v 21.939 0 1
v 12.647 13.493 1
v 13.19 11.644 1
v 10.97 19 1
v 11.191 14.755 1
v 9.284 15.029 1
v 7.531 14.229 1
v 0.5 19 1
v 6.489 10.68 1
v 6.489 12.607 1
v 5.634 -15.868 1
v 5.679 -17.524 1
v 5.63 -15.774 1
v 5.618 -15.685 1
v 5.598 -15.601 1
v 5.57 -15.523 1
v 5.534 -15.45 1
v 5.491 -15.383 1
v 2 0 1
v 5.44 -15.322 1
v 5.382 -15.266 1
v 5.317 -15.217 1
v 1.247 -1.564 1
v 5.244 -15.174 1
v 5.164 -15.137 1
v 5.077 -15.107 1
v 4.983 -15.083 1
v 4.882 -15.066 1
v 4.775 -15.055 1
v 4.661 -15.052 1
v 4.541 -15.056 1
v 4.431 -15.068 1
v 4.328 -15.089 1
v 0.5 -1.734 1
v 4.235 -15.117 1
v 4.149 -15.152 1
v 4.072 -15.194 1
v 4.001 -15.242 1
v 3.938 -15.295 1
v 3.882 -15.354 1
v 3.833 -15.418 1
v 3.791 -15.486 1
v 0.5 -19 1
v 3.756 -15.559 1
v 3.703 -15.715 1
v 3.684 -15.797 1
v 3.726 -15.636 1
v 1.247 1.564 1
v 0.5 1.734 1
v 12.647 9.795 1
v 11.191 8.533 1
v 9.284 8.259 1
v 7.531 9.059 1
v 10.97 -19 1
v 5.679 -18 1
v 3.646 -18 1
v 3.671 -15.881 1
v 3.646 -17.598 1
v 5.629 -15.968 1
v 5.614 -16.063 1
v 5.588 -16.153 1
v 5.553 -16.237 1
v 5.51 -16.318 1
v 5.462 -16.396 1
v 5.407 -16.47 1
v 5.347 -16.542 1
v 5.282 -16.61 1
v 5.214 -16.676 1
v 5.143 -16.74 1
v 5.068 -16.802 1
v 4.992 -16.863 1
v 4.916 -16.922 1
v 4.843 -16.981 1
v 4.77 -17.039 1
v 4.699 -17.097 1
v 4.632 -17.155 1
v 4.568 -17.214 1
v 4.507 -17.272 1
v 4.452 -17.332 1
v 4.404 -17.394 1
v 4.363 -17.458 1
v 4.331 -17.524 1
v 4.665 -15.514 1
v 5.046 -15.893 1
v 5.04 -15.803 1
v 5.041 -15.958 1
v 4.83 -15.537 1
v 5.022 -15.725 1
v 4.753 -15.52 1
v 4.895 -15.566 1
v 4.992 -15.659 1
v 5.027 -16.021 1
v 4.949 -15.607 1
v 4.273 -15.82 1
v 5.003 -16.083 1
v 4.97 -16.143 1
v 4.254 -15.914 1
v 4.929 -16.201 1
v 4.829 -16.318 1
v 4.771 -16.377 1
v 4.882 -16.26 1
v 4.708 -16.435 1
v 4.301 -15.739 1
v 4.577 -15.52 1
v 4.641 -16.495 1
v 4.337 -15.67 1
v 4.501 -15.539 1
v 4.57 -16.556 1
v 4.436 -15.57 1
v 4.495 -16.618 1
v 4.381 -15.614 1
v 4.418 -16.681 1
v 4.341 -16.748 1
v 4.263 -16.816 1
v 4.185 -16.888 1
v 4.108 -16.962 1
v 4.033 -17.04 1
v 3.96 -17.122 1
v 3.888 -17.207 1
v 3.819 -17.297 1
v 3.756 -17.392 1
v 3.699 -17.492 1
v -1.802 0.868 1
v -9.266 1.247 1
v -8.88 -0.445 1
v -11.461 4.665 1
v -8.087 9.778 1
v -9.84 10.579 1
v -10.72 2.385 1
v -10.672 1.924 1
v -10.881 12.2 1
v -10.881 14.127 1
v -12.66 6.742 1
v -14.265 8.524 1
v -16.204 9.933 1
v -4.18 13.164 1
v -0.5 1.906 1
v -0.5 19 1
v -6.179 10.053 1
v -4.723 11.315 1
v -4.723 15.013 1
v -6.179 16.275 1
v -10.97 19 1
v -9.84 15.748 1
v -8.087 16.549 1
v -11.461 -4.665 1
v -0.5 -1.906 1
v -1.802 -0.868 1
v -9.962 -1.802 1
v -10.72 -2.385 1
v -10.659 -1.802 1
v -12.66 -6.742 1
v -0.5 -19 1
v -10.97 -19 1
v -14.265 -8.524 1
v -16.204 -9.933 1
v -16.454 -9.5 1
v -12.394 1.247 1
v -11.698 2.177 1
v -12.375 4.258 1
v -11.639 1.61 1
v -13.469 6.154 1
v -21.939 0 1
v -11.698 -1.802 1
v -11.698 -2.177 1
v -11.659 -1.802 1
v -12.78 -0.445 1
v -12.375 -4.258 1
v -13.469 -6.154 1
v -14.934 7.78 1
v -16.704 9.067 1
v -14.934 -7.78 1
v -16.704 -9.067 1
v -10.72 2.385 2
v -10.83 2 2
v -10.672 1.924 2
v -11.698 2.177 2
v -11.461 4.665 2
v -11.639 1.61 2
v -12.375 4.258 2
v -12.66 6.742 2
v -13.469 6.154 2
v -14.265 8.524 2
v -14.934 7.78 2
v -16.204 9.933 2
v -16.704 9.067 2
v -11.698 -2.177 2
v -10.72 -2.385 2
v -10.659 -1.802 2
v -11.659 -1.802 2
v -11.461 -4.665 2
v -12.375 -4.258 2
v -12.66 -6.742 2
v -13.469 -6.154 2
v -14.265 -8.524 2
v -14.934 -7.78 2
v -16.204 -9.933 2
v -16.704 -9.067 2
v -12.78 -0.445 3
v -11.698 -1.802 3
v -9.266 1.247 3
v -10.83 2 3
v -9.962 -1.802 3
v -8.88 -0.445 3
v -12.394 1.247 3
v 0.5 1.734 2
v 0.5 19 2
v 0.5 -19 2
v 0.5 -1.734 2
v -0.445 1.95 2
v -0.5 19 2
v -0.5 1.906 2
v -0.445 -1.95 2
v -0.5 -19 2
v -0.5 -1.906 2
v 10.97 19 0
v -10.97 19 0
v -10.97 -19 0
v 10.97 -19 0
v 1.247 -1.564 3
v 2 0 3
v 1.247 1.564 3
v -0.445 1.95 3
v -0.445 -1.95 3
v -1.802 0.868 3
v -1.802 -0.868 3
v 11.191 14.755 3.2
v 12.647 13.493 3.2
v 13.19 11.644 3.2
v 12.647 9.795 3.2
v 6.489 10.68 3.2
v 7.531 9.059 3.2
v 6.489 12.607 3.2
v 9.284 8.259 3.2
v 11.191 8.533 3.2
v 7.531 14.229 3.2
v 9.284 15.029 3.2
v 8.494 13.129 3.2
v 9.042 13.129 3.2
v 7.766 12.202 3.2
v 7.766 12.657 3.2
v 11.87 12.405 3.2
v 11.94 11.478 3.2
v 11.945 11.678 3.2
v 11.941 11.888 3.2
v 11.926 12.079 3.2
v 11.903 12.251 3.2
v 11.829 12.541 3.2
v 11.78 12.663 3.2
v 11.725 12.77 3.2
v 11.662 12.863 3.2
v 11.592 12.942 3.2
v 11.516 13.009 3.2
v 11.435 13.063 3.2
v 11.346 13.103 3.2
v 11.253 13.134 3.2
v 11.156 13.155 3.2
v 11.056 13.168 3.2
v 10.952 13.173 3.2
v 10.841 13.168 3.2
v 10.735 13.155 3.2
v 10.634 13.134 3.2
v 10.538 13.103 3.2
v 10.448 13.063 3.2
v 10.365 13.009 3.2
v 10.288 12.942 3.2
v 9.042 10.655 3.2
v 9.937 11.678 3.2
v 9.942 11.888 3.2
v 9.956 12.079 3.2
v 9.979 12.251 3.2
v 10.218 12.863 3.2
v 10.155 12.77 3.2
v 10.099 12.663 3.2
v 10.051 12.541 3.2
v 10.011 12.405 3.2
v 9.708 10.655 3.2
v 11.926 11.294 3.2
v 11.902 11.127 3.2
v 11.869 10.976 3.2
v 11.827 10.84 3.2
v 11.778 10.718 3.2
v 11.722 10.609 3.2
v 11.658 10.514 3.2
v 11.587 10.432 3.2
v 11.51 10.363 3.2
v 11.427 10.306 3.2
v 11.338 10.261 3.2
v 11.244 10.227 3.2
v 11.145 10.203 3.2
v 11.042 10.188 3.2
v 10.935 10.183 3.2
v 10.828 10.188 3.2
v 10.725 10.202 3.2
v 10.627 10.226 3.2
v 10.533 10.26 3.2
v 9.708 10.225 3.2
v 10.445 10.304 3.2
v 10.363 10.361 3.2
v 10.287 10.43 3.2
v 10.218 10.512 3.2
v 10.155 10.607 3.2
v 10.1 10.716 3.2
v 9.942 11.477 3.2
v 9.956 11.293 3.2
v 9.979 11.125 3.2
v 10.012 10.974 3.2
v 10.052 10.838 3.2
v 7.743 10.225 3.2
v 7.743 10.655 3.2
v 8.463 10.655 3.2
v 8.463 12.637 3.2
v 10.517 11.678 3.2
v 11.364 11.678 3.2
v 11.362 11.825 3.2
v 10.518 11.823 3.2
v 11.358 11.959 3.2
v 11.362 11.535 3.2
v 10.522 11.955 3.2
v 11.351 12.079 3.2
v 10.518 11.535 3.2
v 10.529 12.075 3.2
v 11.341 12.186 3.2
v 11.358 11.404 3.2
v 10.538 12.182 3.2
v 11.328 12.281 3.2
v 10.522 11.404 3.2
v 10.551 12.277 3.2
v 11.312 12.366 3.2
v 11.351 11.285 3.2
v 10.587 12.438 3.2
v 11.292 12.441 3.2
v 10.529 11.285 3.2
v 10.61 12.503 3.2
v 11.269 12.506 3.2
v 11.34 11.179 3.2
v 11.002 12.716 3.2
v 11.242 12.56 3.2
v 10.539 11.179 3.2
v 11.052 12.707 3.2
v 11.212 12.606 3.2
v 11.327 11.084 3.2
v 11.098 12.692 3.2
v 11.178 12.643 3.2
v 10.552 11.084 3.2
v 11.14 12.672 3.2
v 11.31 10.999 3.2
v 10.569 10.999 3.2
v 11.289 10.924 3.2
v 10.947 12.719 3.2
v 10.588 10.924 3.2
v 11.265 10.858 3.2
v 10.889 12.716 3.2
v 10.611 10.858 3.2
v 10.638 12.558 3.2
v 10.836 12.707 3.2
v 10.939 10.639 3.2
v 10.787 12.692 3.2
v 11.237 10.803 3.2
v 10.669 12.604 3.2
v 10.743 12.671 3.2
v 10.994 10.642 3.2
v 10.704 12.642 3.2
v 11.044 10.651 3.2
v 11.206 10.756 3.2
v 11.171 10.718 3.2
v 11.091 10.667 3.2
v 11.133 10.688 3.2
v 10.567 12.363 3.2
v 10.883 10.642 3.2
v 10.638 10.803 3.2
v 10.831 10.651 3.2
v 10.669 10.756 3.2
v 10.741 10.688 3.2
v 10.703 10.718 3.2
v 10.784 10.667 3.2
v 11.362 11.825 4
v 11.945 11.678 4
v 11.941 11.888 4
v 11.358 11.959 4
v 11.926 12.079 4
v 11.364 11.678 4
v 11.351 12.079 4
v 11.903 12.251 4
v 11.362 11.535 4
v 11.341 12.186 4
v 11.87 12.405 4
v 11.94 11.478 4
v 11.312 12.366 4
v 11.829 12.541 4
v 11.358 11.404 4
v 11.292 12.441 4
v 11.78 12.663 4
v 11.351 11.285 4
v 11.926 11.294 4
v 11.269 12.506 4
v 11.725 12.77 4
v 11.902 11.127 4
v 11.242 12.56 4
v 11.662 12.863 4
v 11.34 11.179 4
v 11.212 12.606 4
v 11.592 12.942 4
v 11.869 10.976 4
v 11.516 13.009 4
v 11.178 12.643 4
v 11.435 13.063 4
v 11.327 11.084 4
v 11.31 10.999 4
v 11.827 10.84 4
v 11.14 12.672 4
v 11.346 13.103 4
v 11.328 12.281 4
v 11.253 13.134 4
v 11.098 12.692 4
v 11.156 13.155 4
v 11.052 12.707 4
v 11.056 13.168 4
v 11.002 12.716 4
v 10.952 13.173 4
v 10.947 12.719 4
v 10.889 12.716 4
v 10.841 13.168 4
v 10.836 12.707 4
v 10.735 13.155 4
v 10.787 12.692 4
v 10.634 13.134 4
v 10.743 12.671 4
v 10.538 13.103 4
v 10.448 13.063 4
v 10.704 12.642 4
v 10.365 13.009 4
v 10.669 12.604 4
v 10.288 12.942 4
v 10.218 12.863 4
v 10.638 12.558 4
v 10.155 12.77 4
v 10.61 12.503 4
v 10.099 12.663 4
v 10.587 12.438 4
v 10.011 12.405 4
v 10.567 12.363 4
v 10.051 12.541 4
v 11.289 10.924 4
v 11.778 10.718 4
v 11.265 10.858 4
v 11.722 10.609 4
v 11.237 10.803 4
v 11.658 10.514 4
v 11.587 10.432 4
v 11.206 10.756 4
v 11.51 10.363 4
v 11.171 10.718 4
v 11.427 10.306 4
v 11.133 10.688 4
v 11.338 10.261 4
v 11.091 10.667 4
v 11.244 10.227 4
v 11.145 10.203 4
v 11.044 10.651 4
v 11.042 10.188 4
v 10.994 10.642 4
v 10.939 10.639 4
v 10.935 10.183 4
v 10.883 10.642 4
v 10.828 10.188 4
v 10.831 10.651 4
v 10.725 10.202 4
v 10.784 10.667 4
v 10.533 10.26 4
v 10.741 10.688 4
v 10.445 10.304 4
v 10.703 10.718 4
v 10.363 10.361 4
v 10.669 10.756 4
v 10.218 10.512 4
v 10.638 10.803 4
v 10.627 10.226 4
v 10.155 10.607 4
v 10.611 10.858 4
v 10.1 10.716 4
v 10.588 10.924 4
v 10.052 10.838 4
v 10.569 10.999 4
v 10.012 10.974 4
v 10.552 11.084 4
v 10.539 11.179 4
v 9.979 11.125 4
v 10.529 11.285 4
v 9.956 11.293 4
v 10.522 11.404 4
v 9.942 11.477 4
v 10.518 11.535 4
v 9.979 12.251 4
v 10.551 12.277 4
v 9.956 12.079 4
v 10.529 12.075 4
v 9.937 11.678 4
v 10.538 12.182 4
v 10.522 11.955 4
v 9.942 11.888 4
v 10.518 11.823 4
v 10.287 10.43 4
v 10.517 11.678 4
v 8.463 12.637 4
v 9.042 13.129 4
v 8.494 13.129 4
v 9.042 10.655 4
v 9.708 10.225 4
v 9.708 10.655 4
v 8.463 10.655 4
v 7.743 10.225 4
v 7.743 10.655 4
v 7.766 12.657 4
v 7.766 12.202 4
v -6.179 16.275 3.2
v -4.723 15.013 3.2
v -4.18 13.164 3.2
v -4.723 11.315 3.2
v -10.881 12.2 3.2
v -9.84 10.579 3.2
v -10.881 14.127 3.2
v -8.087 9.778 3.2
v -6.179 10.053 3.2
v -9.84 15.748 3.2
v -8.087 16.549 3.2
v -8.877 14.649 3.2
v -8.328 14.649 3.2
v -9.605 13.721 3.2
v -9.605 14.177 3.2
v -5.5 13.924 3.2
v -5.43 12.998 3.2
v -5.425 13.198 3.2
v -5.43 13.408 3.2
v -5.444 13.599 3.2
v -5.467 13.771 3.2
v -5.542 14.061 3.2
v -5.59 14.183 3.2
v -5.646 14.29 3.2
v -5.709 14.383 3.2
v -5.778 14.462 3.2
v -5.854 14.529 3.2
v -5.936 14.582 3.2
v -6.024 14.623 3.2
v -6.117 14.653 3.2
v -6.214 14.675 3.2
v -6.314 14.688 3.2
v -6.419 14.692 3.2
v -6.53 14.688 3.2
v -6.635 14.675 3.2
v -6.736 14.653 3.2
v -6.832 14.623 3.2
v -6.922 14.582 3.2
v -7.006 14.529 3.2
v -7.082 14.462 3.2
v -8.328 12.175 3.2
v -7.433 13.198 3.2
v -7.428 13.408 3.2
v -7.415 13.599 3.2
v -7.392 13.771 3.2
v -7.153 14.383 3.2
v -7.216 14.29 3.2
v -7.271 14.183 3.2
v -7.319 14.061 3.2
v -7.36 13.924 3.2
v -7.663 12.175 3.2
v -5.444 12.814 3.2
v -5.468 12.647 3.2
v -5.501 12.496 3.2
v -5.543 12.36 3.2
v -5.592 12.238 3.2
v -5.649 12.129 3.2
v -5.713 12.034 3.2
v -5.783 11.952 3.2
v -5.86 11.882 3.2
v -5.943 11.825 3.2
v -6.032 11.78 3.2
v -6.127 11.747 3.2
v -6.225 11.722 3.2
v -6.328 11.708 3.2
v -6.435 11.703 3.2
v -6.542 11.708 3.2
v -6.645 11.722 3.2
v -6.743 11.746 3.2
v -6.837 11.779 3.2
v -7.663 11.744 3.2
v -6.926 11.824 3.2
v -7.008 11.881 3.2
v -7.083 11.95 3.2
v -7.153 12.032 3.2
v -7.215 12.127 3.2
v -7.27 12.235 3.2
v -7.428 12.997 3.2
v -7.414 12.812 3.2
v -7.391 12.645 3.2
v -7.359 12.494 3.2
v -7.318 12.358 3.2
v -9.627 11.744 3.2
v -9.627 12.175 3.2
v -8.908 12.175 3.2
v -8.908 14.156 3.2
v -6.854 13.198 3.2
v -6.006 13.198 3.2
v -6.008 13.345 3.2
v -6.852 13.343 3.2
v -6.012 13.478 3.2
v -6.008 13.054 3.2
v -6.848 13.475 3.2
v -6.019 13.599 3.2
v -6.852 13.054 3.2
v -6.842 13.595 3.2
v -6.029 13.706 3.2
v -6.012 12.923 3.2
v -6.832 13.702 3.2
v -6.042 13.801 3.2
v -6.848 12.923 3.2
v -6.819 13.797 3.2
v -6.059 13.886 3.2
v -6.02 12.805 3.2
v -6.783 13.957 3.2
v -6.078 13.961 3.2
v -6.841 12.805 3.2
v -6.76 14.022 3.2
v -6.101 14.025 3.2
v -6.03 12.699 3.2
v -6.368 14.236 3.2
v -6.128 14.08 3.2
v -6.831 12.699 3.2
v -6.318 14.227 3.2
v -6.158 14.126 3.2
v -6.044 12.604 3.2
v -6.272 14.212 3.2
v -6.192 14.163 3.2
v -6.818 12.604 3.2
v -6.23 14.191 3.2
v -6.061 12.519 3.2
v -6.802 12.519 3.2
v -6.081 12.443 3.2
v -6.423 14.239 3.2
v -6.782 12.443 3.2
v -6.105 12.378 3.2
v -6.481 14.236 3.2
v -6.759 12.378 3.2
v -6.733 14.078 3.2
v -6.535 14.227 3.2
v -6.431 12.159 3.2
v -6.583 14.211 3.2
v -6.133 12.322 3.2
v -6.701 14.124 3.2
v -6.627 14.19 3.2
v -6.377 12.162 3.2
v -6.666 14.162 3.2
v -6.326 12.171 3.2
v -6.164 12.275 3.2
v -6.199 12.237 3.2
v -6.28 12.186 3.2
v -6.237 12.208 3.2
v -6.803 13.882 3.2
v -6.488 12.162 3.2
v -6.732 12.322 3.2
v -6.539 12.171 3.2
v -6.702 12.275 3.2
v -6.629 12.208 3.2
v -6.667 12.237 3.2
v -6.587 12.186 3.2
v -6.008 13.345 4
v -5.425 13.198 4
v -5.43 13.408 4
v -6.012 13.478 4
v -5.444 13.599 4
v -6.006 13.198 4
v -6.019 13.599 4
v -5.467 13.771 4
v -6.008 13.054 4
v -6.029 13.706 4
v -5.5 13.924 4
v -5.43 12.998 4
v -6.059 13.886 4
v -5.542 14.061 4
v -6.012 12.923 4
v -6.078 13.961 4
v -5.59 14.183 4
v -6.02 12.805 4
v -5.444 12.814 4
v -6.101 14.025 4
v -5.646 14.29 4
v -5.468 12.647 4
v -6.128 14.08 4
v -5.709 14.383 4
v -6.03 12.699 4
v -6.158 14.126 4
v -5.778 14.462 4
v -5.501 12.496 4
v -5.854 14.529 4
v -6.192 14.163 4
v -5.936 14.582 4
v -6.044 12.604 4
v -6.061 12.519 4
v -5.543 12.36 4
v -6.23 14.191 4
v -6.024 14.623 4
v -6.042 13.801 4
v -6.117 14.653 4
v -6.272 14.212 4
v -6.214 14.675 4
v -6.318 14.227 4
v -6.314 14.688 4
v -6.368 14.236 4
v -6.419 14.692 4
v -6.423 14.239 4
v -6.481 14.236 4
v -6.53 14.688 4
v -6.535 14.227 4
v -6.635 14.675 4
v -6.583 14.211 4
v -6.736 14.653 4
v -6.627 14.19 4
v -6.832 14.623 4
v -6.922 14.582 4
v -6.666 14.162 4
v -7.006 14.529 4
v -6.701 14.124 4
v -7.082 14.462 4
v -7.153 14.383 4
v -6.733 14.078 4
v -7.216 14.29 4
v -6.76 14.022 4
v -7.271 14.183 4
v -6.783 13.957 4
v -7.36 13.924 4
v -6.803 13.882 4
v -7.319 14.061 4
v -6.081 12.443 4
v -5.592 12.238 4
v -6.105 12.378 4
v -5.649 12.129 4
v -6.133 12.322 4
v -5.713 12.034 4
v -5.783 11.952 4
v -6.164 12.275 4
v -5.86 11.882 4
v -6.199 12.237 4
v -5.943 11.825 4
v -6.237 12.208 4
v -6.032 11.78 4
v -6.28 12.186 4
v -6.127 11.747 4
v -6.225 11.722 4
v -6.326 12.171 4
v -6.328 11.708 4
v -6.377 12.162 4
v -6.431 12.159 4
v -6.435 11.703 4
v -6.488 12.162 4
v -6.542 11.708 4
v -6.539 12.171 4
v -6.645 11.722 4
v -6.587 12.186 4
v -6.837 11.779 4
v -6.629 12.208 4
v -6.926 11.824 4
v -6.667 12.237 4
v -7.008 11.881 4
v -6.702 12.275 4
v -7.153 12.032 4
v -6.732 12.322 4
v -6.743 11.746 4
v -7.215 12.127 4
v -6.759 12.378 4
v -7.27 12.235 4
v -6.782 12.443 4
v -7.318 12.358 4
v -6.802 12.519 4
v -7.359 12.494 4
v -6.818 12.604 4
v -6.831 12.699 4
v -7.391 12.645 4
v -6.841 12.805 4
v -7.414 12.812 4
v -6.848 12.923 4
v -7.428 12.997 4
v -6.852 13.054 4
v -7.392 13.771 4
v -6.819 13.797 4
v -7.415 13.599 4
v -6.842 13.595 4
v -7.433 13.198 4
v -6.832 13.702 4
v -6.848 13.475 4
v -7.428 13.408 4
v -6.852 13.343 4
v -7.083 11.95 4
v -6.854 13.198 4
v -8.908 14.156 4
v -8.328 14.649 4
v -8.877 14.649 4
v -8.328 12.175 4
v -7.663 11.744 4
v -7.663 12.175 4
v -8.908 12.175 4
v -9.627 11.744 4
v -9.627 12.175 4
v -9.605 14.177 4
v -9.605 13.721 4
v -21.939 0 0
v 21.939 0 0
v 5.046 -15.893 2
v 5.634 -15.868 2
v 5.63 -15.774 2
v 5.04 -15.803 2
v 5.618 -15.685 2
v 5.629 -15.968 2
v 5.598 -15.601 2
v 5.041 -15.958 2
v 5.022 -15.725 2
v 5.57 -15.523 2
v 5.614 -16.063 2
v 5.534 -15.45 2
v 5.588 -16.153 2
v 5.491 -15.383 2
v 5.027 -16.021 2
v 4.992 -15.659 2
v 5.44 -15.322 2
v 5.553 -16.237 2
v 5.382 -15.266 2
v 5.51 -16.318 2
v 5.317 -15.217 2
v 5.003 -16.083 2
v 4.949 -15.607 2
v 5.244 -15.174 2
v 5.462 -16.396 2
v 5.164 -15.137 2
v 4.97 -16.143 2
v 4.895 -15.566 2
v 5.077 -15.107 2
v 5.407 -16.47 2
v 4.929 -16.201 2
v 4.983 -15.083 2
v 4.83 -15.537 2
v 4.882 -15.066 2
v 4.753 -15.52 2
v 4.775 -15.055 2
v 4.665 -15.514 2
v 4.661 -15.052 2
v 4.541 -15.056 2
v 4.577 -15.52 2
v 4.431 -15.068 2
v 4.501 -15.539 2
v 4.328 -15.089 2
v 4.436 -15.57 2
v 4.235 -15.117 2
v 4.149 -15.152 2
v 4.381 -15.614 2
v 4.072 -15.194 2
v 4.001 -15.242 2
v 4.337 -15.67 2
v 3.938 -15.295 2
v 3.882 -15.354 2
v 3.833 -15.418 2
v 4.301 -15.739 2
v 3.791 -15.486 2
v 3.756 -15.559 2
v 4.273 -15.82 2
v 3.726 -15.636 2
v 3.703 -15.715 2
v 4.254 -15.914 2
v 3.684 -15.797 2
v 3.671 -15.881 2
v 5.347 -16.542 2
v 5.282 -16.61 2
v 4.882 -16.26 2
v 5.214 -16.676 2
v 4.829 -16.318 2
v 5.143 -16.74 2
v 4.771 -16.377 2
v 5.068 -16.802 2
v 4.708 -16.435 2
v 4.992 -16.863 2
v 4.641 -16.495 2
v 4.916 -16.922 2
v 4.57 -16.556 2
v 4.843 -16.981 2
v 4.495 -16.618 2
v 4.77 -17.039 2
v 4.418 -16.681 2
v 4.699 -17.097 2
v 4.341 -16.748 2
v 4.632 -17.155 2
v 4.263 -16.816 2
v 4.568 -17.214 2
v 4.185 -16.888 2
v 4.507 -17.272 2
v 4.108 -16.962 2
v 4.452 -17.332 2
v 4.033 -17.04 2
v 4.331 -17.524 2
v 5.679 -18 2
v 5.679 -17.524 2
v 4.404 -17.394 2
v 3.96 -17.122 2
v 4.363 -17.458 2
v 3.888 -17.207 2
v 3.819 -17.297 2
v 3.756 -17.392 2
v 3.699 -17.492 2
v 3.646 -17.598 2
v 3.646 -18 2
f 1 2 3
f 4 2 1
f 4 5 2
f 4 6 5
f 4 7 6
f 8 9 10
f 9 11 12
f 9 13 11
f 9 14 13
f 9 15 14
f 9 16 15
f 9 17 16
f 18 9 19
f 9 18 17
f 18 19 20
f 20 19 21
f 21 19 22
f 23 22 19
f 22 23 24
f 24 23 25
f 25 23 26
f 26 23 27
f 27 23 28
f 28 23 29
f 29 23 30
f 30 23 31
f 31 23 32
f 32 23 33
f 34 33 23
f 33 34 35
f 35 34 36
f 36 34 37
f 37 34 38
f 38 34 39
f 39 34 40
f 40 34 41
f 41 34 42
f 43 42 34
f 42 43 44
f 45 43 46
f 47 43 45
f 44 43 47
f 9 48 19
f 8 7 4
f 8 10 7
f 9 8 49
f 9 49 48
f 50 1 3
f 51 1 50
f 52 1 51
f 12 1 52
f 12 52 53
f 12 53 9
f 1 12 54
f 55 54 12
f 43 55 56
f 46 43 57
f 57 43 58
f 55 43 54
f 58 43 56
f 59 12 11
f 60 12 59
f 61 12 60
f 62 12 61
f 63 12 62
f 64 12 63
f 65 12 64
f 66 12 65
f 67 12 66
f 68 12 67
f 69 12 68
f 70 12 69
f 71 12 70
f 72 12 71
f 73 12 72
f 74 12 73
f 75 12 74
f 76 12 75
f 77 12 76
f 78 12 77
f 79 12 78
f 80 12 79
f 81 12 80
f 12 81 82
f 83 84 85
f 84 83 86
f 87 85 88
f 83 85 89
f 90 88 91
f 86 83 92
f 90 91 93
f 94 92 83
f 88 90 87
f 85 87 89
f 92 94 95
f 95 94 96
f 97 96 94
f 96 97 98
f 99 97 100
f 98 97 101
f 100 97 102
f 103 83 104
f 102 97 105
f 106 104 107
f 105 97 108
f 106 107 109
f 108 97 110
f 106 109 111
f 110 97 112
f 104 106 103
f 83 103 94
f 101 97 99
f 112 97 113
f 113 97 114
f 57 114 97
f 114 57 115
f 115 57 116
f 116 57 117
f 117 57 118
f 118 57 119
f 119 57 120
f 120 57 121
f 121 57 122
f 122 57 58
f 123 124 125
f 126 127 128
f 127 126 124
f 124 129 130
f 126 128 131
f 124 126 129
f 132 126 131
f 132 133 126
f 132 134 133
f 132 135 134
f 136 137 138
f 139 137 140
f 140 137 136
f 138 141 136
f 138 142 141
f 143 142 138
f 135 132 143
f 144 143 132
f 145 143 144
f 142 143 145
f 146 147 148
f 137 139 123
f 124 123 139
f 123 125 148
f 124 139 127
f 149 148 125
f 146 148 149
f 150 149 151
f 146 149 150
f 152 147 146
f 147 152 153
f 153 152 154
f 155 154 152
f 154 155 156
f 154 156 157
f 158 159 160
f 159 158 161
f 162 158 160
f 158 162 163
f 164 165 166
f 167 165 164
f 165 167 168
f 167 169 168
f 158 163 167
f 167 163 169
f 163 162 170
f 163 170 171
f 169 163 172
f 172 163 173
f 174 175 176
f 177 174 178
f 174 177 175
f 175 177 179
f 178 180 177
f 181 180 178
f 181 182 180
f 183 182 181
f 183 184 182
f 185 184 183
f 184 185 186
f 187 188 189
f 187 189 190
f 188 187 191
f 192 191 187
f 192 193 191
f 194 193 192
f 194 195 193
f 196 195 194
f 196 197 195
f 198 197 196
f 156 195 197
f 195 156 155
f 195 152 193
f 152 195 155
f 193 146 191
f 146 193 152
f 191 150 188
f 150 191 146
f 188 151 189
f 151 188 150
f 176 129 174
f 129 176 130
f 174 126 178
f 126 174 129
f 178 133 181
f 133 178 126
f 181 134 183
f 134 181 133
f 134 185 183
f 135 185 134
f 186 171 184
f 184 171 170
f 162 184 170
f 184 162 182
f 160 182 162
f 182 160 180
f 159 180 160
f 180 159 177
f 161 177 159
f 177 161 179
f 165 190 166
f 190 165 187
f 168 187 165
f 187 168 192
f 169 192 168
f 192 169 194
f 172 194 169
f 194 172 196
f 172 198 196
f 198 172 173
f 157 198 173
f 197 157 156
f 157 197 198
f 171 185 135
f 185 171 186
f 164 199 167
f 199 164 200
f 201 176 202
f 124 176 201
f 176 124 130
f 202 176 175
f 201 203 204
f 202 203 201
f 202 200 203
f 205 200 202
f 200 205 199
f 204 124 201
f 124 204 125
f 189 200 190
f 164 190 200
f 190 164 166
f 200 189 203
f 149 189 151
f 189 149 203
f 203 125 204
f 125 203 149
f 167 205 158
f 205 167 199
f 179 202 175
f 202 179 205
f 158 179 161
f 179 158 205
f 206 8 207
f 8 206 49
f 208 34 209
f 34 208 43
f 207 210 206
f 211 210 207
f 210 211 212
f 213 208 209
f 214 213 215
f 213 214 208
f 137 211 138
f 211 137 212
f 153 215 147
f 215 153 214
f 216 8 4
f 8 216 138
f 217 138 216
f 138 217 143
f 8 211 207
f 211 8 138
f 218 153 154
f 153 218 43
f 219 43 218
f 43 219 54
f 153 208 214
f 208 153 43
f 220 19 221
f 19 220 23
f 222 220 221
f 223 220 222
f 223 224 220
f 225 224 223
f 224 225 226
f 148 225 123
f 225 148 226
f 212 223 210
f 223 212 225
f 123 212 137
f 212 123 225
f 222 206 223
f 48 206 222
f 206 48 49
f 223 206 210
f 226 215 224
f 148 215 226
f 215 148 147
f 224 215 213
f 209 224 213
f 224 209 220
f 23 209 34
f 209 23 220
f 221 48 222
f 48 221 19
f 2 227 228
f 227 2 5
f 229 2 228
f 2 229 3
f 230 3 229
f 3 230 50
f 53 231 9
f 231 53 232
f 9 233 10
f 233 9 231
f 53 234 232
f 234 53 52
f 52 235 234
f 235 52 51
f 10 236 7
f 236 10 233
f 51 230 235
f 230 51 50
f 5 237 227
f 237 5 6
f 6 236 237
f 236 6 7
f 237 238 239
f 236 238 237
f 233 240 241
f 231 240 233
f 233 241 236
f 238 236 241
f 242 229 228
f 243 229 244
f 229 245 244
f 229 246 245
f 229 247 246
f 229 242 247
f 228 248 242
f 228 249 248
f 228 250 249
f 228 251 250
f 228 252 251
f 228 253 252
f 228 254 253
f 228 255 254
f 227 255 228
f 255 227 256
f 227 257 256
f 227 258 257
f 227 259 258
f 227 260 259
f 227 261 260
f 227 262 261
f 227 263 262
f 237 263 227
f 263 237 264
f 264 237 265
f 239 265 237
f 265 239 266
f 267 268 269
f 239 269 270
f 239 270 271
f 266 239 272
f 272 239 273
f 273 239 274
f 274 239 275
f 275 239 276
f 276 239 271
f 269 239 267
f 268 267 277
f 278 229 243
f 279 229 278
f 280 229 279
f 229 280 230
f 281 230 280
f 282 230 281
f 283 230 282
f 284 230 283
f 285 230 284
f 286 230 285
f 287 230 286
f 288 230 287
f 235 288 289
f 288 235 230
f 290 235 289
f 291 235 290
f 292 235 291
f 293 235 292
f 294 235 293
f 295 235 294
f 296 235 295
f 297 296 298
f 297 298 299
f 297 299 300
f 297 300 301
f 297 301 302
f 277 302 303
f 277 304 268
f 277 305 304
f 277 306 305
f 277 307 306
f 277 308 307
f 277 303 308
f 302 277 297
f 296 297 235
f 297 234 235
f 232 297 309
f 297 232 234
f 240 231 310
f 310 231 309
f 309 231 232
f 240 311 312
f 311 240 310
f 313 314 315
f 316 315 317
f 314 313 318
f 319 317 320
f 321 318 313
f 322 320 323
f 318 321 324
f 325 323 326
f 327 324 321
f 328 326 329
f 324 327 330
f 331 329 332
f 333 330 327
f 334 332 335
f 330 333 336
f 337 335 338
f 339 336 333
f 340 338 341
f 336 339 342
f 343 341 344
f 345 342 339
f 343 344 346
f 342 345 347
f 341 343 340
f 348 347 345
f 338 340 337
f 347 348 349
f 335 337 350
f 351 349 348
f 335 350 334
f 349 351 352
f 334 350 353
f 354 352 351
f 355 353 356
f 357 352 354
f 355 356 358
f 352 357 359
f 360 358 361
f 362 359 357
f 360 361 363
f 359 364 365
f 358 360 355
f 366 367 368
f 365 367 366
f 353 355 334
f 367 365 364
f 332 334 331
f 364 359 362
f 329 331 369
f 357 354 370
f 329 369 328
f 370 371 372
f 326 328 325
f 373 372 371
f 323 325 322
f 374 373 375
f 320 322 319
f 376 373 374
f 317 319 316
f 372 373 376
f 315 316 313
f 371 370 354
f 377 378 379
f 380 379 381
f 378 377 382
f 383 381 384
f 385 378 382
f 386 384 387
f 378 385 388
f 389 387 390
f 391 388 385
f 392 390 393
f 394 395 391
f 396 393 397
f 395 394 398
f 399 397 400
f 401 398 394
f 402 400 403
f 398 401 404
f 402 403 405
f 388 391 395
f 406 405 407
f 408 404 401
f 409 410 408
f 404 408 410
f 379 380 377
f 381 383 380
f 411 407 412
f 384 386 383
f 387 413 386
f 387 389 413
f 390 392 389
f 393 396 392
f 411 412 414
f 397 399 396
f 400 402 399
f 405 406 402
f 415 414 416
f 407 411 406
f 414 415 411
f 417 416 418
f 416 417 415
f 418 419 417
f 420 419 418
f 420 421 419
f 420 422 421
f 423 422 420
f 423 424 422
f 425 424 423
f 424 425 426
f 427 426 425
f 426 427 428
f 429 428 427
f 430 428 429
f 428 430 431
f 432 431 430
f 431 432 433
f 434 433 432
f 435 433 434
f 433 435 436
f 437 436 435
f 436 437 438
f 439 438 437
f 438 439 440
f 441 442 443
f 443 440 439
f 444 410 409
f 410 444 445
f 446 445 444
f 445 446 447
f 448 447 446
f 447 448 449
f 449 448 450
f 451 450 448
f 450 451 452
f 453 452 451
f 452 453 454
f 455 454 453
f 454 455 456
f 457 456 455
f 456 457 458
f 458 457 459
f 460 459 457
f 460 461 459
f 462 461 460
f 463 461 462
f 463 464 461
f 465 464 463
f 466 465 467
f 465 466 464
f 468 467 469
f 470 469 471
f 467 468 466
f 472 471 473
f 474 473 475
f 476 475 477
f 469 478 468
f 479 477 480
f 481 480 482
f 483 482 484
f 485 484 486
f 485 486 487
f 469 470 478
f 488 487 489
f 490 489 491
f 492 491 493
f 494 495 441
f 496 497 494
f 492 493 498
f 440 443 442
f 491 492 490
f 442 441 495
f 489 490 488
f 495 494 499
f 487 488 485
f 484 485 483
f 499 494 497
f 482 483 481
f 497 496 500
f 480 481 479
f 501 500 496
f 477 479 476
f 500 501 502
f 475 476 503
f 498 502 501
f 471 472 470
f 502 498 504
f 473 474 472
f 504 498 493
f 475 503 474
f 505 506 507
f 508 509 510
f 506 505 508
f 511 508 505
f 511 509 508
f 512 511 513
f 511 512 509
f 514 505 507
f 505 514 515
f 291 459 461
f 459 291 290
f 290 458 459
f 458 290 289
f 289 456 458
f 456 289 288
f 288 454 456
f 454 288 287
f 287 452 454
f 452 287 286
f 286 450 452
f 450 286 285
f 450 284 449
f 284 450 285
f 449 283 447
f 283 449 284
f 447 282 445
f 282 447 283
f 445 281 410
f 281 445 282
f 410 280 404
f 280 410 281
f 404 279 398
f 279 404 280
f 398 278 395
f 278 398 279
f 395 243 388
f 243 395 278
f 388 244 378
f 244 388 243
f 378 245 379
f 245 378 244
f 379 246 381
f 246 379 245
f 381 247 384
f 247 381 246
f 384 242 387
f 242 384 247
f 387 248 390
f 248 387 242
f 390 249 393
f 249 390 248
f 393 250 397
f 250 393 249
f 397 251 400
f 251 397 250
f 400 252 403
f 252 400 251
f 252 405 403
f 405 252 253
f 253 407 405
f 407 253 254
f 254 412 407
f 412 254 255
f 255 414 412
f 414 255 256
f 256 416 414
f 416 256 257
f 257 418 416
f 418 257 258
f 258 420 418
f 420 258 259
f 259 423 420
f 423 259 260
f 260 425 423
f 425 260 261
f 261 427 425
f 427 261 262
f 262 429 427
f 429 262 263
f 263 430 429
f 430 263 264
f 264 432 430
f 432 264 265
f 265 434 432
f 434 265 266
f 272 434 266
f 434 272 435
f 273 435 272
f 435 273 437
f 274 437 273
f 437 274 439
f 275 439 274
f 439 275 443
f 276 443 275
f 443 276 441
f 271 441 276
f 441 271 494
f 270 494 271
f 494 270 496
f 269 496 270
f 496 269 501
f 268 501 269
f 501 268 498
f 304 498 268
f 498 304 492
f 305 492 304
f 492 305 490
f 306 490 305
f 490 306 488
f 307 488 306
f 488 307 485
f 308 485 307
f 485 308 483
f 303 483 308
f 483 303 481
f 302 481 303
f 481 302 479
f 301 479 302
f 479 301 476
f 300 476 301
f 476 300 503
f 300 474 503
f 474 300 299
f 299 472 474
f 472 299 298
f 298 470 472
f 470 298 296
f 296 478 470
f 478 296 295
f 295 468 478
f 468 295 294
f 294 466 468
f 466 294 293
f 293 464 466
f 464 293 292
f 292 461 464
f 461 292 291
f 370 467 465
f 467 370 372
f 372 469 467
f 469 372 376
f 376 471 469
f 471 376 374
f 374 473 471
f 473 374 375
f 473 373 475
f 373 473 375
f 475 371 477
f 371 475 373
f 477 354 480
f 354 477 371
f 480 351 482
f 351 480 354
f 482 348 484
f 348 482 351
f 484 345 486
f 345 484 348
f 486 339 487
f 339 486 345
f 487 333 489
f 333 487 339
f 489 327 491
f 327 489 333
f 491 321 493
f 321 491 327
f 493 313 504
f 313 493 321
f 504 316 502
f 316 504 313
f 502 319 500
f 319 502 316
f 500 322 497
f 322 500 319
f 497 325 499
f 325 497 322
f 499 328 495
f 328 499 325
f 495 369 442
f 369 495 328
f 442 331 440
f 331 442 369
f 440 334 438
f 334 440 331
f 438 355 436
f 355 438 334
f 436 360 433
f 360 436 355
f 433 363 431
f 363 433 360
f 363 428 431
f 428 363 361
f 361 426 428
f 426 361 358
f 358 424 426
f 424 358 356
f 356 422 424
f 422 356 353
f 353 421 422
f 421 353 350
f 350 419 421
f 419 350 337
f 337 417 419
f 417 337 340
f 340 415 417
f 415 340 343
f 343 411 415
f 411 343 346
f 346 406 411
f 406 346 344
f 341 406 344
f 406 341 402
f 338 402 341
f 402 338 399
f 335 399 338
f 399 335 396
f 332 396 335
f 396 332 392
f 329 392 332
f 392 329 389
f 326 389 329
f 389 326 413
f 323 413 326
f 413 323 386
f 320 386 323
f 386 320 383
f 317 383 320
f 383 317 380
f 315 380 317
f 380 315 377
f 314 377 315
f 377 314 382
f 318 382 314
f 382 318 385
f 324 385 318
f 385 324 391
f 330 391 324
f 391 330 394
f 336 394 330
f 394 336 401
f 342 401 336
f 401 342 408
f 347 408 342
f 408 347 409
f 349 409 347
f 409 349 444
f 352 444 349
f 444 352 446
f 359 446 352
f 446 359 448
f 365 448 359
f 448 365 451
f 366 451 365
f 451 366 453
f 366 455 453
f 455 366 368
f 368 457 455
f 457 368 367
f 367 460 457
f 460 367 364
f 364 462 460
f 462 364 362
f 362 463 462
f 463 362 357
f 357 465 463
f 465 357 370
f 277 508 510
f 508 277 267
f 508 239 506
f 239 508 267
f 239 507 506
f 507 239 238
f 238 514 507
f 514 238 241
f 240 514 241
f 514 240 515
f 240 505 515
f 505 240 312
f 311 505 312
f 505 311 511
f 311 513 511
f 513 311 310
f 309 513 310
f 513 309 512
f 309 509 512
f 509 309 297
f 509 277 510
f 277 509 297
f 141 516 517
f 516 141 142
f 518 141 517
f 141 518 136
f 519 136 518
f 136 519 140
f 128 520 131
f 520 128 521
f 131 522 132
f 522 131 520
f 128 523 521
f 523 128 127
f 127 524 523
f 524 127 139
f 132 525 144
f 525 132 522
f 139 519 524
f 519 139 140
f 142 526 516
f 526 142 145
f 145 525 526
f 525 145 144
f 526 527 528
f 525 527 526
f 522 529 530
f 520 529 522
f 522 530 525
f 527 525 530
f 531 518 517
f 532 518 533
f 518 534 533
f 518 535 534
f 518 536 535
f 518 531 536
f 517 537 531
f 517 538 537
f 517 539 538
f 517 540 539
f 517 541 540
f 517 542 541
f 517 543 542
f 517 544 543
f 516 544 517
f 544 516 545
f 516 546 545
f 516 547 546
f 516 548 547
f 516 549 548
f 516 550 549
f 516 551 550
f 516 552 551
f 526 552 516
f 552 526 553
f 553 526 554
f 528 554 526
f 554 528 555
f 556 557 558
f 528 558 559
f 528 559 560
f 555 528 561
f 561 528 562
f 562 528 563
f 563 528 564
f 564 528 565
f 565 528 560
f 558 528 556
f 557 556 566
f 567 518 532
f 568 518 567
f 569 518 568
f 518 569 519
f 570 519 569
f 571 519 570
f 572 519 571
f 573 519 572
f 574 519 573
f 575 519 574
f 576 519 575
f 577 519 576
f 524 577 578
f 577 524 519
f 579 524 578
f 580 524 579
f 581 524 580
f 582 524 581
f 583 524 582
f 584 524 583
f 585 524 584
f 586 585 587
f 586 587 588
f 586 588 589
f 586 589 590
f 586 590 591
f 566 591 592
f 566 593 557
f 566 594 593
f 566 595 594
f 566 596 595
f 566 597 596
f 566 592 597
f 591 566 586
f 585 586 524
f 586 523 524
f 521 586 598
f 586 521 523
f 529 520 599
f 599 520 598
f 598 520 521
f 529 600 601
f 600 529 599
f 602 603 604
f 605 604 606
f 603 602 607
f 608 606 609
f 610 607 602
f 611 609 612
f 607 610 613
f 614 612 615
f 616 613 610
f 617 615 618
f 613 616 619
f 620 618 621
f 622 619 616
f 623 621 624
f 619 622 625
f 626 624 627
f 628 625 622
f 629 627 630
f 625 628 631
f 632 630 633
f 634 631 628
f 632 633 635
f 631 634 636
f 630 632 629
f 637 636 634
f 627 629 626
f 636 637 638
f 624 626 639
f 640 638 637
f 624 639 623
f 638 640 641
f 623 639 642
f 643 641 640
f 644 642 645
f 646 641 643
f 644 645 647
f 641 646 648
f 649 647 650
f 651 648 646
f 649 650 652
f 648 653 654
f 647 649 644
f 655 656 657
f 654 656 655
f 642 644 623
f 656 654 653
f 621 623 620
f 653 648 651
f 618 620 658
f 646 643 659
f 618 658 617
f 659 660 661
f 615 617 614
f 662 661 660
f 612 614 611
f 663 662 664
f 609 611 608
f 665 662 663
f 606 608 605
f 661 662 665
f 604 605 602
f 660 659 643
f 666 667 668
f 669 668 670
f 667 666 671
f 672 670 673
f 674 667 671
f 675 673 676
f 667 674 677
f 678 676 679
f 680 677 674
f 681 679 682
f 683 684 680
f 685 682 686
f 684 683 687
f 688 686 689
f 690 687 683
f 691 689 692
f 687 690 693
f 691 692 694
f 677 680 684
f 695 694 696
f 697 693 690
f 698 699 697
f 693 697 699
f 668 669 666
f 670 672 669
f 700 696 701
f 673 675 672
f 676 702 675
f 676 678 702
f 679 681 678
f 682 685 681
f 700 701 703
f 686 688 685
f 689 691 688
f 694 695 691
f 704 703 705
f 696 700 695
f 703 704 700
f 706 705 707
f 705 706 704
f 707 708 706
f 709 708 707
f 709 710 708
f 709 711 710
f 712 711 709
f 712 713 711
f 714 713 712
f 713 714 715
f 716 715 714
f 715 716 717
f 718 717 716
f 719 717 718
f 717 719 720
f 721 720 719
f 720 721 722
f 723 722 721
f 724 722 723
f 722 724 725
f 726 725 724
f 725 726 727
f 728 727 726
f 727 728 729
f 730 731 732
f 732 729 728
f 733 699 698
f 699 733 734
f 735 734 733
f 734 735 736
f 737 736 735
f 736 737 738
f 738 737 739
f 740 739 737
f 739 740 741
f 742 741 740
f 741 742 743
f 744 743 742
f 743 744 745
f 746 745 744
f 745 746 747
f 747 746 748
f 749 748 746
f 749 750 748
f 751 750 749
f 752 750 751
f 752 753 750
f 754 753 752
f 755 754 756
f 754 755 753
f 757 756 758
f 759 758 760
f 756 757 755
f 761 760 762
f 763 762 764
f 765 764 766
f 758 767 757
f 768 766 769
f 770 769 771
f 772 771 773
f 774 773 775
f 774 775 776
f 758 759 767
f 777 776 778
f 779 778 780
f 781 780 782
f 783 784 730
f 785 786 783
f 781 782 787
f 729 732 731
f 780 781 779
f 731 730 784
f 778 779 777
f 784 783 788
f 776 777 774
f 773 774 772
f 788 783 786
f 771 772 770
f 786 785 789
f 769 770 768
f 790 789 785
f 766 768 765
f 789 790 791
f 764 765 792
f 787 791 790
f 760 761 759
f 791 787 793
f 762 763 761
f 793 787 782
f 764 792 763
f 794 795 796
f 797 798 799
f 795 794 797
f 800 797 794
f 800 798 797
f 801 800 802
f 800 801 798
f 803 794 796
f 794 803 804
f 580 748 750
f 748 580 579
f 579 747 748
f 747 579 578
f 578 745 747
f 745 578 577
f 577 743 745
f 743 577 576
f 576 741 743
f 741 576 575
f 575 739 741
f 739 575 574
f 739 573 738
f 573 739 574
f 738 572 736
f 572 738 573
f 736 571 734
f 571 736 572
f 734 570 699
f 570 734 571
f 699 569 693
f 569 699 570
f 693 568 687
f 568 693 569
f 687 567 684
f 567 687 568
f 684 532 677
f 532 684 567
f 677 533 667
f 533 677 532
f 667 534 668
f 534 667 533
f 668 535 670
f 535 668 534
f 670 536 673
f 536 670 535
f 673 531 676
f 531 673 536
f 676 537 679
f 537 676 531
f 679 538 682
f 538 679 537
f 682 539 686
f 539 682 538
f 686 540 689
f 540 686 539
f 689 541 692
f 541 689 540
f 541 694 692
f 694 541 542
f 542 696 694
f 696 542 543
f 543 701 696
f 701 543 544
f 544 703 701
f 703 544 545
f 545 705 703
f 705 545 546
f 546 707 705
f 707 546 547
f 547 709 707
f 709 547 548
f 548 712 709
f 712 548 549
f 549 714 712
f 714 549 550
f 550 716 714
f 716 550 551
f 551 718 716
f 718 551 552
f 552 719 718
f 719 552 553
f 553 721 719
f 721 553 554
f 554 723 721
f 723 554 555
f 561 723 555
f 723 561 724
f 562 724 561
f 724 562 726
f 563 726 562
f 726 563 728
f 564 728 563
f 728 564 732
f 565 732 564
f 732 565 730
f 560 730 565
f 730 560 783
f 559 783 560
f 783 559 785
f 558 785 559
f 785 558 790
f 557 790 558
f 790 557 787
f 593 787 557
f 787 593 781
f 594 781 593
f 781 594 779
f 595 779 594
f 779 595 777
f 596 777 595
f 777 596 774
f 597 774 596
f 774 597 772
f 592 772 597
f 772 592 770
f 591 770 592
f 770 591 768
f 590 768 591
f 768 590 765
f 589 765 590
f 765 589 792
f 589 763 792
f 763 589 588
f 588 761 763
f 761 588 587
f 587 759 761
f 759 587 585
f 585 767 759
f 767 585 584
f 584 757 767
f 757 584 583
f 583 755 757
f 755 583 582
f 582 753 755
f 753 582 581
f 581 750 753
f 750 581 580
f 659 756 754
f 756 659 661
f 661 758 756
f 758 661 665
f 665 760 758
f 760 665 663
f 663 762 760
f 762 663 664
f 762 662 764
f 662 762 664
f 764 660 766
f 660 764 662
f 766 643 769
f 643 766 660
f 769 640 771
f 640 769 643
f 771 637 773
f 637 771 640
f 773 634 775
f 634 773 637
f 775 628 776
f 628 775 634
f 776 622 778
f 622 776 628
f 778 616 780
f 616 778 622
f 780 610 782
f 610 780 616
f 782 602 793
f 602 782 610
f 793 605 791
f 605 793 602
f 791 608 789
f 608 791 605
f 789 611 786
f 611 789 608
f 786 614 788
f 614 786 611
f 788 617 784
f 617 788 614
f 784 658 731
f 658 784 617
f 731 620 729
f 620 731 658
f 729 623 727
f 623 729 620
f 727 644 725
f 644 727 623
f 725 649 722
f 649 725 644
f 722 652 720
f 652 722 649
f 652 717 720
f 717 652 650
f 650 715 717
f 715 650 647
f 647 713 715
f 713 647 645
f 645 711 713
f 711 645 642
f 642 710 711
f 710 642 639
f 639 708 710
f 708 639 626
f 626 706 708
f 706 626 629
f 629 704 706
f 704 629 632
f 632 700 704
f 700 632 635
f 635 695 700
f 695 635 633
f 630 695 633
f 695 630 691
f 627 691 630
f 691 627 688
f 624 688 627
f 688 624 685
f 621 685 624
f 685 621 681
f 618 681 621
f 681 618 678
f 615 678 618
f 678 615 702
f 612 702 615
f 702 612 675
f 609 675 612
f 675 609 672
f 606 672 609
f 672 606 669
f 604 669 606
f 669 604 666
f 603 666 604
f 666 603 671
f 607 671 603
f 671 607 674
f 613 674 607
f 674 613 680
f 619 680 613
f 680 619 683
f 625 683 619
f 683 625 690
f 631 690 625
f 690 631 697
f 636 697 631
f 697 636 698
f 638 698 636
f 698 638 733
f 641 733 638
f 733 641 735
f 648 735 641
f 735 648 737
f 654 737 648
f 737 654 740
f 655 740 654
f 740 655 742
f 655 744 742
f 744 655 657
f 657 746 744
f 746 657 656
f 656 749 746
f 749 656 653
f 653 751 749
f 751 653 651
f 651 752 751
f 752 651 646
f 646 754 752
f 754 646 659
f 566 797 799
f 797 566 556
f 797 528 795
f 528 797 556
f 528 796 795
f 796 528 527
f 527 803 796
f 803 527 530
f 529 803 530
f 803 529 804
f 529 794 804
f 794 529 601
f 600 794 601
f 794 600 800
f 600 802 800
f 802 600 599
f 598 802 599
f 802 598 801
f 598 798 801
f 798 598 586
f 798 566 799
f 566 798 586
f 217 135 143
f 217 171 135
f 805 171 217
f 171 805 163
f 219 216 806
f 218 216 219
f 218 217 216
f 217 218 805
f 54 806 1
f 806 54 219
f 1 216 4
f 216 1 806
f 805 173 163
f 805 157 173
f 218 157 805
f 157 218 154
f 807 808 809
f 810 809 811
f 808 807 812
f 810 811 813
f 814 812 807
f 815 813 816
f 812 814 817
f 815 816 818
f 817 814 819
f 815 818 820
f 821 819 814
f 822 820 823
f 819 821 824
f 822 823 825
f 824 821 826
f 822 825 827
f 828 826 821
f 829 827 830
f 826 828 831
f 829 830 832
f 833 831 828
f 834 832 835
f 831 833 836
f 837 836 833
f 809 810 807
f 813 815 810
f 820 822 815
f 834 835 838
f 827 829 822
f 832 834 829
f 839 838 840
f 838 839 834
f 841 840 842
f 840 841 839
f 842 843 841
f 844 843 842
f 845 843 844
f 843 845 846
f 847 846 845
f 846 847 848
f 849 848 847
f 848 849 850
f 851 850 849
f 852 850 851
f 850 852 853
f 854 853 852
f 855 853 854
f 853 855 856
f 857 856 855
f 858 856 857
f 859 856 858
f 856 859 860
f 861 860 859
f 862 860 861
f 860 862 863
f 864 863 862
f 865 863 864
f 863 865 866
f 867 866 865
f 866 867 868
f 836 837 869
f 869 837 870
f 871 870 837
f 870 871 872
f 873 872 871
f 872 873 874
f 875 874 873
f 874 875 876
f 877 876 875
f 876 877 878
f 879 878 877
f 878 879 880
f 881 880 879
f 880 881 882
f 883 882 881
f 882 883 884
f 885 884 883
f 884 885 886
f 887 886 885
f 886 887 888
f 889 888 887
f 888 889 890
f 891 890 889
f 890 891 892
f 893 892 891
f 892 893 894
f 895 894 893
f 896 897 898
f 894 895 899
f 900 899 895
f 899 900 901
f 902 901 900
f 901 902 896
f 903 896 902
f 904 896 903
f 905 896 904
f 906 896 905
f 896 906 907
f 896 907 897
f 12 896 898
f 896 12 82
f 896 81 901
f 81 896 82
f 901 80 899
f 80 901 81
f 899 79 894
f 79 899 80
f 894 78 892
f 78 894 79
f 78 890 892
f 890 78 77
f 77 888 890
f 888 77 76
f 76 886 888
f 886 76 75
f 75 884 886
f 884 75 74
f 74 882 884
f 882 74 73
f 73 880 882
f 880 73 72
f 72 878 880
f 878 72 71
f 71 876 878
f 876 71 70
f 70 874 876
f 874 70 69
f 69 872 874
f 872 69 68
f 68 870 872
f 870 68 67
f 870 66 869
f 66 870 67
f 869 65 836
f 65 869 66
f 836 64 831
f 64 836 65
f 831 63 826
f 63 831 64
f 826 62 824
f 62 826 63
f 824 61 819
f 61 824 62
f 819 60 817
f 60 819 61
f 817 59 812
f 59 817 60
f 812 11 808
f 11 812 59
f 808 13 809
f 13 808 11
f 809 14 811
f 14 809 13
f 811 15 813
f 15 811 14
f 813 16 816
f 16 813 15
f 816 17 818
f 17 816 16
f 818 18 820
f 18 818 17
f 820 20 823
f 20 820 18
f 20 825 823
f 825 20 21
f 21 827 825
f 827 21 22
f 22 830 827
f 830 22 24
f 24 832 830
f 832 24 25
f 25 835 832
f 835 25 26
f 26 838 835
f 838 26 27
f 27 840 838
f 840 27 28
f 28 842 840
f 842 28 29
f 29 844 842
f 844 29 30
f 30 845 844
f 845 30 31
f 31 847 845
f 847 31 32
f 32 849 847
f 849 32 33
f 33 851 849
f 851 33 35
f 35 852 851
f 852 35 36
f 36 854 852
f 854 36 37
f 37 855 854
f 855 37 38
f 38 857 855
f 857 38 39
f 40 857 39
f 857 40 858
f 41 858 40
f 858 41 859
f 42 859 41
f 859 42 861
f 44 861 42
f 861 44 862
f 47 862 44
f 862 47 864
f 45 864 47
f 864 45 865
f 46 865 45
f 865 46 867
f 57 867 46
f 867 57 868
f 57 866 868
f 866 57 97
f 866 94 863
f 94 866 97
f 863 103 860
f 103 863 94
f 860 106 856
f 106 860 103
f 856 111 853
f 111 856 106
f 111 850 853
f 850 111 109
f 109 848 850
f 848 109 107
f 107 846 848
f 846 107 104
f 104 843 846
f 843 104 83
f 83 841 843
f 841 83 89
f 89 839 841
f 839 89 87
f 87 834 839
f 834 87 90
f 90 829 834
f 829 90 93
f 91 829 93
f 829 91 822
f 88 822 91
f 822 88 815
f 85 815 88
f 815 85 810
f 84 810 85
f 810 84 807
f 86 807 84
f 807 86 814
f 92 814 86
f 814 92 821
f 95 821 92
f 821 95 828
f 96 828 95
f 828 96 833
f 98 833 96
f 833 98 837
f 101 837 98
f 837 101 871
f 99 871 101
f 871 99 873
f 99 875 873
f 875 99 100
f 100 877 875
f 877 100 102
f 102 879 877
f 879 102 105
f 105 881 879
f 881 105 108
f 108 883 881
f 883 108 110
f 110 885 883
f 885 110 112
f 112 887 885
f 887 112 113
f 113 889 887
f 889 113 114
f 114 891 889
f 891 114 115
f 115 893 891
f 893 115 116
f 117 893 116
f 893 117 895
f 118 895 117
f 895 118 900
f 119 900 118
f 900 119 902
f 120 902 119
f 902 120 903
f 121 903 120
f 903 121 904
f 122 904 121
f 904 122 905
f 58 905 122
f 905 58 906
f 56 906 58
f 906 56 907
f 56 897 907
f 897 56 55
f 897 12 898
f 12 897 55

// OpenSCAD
include <../Scripts/18xx tiles basic functions.scad>
hex();
small_town_sharp_curve(r=4);
small_town_straight(r=0);
put_tilenr("2");
put_value("10",40);
put_value("10",-30);
